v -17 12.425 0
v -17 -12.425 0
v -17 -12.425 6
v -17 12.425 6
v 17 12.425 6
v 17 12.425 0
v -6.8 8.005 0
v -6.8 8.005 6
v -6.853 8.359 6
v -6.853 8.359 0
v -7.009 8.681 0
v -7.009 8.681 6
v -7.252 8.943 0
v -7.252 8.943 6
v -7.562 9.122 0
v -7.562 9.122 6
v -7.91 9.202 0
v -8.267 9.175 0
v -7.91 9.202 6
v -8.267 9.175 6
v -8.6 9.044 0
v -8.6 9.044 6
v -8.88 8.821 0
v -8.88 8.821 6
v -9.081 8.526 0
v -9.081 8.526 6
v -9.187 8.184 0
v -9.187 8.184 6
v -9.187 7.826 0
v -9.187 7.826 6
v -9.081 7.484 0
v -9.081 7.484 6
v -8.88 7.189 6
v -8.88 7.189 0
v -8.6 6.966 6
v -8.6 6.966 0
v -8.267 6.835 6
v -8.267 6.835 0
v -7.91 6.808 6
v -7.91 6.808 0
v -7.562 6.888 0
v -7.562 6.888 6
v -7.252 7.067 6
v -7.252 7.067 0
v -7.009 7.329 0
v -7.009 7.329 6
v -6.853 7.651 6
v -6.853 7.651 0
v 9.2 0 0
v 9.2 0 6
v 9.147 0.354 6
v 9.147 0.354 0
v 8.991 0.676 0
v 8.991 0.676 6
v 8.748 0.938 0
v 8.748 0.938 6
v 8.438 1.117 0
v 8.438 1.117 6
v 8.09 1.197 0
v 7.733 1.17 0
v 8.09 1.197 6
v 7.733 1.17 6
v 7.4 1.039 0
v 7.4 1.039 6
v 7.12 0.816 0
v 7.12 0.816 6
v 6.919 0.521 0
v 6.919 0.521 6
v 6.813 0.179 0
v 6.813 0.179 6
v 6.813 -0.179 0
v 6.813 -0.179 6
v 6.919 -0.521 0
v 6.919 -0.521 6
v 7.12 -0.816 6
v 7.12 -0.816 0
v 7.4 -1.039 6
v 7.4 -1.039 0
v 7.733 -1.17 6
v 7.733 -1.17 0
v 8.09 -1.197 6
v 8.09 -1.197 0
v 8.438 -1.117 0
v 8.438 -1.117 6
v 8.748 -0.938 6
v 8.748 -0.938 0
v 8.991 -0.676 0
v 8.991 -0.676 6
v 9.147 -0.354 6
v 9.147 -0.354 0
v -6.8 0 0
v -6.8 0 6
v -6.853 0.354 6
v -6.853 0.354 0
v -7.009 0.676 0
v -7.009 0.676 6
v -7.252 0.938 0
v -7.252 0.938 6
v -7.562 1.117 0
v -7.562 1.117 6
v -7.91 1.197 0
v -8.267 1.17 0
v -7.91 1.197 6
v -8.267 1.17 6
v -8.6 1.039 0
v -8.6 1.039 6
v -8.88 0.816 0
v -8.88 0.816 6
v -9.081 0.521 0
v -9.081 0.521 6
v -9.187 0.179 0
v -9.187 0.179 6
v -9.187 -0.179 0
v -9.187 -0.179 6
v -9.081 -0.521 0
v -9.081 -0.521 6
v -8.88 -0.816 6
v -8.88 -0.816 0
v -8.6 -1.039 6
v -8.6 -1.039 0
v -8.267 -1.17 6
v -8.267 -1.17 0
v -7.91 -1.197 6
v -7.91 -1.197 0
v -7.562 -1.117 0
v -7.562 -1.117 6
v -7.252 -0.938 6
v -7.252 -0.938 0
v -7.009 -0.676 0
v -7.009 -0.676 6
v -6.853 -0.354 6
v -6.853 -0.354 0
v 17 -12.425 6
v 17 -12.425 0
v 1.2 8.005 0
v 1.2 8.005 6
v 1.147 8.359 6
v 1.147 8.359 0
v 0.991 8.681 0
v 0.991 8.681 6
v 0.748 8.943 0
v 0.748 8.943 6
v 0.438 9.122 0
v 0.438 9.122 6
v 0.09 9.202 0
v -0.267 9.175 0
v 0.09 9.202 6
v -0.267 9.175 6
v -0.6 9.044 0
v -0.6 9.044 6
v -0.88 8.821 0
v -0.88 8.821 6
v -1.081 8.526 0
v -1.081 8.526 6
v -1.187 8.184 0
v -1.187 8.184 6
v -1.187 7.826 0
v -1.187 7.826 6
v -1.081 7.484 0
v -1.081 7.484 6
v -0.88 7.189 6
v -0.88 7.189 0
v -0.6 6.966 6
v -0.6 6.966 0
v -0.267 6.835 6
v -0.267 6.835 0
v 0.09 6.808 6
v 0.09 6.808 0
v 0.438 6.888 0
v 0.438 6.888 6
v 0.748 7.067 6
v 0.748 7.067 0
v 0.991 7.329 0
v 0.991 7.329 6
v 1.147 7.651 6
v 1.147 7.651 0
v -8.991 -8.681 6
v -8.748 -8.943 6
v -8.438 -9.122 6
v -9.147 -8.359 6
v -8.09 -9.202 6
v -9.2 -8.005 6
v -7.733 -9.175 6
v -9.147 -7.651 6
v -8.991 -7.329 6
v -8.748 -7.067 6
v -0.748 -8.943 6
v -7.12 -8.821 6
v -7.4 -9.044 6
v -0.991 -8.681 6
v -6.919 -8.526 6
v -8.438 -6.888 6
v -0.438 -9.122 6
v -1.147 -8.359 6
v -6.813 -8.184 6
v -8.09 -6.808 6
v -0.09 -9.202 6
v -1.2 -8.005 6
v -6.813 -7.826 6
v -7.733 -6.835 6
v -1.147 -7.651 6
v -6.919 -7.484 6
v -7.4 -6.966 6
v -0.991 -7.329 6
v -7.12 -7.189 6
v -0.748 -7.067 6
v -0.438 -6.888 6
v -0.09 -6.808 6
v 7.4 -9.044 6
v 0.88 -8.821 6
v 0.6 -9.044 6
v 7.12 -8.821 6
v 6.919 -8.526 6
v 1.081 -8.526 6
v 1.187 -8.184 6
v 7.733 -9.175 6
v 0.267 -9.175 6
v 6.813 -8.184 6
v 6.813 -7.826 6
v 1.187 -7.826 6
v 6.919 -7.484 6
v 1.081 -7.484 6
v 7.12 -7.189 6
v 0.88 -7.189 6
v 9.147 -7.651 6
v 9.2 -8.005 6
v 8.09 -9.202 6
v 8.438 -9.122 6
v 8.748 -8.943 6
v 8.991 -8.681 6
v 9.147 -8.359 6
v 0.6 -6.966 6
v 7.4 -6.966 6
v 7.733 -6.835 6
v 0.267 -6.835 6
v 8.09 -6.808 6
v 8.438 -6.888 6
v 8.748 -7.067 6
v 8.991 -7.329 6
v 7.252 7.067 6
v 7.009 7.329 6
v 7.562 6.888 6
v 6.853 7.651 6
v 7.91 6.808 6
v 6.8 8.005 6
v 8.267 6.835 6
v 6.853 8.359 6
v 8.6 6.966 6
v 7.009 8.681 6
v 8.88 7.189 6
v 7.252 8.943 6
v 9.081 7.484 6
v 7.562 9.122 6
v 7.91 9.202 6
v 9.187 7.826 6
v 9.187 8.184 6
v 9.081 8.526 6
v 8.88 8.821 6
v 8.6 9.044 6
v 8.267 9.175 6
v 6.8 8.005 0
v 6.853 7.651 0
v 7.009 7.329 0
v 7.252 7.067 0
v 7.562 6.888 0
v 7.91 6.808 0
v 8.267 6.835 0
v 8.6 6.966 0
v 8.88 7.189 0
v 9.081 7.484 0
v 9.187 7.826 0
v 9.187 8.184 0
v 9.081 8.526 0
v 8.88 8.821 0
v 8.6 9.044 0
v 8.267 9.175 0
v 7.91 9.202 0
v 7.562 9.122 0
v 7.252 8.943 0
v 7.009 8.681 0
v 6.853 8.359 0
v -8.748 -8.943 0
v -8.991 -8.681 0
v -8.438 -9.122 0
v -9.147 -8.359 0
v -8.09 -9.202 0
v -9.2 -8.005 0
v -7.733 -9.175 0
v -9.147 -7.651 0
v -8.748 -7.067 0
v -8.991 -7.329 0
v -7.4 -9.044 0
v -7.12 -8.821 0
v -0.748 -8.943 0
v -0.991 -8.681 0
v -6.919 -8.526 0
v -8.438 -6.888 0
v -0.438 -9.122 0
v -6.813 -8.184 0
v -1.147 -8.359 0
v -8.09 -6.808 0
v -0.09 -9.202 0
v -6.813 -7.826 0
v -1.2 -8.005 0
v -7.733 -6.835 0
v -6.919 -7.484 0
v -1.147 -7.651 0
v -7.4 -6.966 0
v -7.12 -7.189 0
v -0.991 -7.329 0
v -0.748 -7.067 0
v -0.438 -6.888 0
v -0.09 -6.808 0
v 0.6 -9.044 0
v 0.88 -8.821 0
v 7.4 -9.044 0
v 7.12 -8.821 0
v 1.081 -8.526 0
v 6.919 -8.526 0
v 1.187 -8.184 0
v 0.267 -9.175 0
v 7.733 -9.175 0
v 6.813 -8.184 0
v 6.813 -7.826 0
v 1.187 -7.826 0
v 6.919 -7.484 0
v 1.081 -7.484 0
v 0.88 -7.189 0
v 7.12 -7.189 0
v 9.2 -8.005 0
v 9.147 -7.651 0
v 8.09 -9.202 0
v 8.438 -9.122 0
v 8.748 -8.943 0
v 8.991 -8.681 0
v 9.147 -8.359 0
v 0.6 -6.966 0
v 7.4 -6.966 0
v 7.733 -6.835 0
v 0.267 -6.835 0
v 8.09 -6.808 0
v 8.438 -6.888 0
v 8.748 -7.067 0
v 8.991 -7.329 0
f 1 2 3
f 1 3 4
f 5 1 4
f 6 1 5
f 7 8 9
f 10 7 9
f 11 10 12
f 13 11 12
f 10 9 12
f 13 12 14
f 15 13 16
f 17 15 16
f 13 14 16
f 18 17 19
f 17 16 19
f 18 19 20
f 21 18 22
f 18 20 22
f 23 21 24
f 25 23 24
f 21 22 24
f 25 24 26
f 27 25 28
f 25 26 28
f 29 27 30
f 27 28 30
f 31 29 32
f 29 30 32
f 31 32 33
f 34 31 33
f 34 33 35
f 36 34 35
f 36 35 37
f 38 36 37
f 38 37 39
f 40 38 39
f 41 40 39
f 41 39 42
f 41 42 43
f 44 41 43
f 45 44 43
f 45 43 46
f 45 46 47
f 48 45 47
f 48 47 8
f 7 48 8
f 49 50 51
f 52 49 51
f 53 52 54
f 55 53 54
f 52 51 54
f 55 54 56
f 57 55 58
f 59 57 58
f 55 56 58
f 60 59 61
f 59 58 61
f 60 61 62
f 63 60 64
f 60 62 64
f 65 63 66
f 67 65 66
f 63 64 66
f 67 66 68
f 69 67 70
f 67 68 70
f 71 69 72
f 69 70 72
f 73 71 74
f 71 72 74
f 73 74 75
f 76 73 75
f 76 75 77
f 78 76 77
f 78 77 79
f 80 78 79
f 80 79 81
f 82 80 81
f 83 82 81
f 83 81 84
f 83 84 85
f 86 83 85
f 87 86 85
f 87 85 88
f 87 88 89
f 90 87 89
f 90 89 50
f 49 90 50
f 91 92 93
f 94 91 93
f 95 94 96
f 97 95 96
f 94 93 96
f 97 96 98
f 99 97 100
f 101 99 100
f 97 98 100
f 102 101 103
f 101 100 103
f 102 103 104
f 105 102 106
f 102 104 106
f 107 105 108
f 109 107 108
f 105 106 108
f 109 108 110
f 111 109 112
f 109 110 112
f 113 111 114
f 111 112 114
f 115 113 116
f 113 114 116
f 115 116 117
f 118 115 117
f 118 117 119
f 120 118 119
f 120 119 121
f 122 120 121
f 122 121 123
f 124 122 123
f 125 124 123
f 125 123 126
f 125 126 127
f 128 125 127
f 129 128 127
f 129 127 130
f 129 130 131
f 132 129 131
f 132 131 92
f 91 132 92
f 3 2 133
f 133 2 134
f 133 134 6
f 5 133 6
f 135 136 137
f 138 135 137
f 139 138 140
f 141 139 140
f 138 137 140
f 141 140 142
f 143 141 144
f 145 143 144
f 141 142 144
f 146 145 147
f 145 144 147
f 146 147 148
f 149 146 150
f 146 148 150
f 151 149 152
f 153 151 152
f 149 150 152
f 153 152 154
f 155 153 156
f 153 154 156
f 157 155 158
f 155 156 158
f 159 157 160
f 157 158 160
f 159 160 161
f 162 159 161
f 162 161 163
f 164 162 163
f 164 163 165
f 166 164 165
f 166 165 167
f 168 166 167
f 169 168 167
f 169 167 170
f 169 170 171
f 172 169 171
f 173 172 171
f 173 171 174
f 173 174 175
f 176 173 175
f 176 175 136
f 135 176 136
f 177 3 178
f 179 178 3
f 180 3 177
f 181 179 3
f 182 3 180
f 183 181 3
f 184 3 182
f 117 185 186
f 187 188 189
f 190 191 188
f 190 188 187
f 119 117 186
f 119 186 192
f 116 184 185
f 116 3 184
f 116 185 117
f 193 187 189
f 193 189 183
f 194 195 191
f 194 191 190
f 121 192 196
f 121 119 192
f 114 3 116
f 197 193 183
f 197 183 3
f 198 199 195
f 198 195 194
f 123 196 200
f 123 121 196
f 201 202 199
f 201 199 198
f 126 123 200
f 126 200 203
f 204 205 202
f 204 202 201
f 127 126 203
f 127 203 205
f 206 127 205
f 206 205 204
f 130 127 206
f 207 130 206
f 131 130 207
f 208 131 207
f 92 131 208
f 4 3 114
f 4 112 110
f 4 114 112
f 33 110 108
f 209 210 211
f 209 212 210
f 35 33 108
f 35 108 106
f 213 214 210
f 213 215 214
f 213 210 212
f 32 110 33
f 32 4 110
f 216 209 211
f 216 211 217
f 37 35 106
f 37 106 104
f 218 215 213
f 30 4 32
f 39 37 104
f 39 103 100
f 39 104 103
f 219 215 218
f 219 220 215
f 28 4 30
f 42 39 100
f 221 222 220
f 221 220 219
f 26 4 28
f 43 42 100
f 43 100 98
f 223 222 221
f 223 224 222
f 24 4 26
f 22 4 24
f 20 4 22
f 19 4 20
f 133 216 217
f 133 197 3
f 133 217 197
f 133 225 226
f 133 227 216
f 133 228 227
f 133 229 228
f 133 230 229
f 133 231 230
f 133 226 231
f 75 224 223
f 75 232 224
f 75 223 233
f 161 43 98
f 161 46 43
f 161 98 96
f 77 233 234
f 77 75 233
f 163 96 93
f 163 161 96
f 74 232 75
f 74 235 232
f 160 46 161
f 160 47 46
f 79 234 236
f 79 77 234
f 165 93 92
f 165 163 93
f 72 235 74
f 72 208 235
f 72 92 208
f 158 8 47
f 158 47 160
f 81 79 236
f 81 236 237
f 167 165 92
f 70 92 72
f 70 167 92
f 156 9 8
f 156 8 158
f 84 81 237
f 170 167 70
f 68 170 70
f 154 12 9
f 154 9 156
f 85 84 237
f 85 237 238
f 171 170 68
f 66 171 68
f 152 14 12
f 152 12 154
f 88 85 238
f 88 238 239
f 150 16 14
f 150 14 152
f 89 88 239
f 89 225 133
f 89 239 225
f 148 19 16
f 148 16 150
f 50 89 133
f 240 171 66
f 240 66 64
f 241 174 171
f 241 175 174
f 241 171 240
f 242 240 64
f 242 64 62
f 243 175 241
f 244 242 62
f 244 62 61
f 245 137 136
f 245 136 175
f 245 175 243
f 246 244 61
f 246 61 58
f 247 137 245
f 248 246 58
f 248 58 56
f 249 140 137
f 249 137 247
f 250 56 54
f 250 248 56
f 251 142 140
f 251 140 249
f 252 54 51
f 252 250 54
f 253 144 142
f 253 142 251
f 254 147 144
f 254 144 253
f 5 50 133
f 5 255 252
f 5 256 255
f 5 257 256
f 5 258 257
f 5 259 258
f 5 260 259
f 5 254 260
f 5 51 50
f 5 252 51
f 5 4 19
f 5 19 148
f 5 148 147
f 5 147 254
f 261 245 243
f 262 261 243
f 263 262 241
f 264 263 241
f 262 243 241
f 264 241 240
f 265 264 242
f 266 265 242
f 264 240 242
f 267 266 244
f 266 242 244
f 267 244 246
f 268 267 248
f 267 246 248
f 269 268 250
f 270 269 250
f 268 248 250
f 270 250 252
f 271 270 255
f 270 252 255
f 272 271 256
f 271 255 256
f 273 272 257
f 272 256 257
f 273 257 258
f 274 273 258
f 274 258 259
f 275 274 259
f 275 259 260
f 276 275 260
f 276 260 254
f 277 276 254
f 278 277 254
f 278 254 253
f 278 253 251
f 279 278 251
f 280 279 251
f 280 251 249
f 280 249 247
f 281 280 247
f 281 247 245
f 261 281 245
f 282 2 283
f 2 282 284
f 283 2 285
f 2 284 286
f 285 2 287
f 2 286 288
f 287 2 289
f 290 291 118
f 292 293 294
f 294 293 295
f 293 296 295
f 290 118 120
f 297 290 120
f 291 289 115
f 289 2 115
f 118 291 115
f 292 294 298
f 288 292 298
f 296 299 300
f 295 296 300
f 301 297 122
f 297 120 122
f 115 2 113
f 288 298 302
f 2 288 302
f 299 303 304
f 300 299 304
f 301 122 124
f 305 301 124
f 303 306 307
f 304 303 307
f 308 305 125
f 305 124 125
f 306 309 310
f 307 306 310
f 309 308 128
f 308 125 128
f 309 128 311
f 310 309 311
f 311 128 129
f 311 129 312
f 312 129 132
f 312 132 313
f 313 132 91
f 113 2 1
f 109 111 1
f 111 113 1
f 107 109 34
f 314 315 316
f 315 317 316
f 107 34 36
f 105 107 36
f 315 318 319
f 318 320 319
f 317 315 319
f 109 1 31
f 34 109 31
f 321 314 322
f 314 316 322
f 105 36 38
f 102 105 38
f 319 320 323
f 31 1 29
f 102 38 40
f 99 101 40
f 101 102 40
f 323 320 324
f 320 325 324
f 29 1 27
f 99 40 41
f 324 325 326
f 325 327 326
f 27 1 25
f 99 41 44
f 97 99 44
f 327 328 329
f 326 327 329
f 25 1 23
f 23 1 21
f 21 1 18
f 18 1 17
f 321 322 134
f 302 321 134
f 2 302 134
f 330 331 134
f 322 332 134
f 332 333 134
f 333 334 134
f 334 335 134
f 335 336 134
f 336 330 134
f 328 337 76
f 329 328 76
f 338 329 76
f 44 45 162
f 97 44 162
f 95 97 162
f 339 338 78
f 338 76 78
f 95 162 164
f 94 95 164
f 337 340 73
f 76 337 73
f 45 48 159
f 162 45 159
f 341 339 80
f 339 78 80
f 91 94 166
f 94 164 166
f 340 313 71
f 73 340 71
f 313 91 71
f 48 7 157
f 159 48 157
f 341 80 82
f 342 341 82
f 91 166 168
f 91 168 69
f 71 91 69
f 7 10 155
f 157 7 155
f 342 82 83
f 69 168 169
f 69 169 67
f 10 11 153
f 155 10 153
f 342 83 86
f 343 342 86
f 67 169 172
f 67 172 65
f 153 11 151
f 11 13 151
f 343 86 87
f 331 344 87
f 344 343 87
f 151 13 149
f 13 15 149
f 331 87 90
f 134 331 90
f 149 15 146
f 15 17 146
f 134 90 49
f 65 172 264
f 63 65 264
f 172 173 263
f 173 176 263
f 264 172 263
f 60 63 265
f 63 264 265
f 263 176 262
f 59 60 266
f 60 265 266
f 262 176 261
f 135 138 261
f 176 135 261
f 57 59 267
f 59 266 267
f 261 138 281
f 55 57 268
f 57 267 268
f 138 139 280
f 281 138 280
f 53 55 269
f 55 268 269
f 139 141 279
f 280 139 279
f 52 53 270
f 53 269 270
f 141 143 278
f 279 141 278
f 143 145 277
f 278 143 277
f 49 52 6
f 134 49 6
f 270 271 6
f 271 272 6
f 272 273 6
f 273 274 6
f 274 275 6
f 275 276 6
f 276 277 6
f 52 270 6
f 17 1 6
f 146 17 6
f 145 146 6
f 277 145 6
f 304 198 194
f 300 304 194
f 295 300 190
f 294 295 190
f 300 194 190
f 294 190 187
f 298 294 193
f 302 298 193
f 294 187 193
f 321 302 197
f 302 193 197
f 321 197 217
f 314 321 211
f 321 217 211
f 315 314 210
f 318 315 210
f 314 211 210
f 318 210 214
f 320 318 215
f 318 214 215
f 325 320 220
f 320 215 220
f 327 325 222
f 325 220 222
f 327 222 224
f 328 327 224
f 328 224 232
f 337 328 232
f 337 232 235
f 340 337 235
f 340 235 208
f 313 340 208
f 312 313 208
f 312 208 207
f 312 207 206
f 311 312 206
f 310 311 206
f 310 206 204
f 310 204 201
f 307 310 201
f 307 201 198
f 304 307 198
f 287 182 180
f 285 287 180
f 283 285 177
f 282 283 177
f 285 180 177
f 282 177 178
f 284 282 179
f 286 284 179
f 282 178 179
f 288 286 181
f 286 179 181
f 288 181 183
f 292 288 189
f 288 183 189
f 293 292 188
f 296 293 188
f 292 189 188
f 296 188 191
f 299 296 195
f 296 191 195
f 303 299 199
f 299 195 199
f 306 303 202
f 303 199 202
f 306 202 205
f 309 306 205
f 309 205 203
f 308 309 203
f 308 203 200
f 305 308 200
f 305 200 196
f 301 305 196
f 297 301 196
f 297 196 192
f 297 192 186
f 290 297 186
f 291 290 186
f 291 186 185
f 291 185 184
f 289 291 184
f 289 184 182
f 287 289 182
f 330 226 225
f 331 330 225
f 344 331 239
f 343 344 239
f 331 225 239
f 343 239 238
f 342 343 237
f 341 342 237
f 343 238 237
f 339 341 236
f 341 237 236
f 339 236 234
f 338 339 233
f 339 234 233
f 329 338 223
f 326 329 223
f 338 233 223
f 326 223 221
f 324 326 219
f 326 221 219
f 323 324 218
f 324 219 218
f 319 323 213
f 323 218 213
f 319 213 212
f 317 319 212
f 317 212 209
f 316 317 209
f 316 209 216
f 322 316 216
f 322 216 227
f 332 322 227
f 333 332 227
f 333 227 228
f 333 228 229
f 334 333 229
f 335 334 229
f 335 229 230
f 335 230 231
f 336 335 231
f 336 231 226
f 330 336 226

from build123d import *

# Parameters (mm, degrees)
ESQUISSE1_W             = 34
ESQUISSE1_H             = 24.85
BOSS_EXTRU_1_DEPTH      = 6
ESQUISSE2_R             = 1.2
ENL_V_MAT_EXTRU_1_DEPTH = 22.894762502


with BuildPart() as part:
    # Esquisse1 → Boss.-Extru.1 (new body)
    with BuildSketch(Plane.XY):
        Rectangle(ESQUISSE1_W, ESQUISSE1_H)
    extrude(amount=BOSS_EXTRU_1_DEPTH)

    # Esquisse2 → Enlèv. mat.-Extru.1 (cut, through all)
    with BuildSketch(Plane.XY.offset(6)):
        with Locations((-8, 8.005)):
            Circle(ESQUISSE2_R)
        with Locations(Location((8, 8.005, 0), (0, 0, 180))):
            Circle(ESQUISSE2_R)
        with Locations((0, 8.005)):
            Circle(ESQUISSE2_R)
        with Locations(Location((0, -8.005, 0), (0, 0, 180))):
            Circle(ESQUISSE2_R)
        with Locations((8, -8.005)):
            Circle(ESQUISSE2_R)
        with Locations(Location((-8, -8.005, 0), (0, 0, 180))):
            Circle(ESQUISSE2_R)
        with Locations((-8, 0)):
            Circle(ESQUISSE2_R)
        with Locations((8, 0)):
            Circle(ESQUISSE2_R)
    extrude(amount=-ENL_V_MAT_EXTRU_1_DEPTH, mode=Mode.SUBTRACT)


solid = part.part
